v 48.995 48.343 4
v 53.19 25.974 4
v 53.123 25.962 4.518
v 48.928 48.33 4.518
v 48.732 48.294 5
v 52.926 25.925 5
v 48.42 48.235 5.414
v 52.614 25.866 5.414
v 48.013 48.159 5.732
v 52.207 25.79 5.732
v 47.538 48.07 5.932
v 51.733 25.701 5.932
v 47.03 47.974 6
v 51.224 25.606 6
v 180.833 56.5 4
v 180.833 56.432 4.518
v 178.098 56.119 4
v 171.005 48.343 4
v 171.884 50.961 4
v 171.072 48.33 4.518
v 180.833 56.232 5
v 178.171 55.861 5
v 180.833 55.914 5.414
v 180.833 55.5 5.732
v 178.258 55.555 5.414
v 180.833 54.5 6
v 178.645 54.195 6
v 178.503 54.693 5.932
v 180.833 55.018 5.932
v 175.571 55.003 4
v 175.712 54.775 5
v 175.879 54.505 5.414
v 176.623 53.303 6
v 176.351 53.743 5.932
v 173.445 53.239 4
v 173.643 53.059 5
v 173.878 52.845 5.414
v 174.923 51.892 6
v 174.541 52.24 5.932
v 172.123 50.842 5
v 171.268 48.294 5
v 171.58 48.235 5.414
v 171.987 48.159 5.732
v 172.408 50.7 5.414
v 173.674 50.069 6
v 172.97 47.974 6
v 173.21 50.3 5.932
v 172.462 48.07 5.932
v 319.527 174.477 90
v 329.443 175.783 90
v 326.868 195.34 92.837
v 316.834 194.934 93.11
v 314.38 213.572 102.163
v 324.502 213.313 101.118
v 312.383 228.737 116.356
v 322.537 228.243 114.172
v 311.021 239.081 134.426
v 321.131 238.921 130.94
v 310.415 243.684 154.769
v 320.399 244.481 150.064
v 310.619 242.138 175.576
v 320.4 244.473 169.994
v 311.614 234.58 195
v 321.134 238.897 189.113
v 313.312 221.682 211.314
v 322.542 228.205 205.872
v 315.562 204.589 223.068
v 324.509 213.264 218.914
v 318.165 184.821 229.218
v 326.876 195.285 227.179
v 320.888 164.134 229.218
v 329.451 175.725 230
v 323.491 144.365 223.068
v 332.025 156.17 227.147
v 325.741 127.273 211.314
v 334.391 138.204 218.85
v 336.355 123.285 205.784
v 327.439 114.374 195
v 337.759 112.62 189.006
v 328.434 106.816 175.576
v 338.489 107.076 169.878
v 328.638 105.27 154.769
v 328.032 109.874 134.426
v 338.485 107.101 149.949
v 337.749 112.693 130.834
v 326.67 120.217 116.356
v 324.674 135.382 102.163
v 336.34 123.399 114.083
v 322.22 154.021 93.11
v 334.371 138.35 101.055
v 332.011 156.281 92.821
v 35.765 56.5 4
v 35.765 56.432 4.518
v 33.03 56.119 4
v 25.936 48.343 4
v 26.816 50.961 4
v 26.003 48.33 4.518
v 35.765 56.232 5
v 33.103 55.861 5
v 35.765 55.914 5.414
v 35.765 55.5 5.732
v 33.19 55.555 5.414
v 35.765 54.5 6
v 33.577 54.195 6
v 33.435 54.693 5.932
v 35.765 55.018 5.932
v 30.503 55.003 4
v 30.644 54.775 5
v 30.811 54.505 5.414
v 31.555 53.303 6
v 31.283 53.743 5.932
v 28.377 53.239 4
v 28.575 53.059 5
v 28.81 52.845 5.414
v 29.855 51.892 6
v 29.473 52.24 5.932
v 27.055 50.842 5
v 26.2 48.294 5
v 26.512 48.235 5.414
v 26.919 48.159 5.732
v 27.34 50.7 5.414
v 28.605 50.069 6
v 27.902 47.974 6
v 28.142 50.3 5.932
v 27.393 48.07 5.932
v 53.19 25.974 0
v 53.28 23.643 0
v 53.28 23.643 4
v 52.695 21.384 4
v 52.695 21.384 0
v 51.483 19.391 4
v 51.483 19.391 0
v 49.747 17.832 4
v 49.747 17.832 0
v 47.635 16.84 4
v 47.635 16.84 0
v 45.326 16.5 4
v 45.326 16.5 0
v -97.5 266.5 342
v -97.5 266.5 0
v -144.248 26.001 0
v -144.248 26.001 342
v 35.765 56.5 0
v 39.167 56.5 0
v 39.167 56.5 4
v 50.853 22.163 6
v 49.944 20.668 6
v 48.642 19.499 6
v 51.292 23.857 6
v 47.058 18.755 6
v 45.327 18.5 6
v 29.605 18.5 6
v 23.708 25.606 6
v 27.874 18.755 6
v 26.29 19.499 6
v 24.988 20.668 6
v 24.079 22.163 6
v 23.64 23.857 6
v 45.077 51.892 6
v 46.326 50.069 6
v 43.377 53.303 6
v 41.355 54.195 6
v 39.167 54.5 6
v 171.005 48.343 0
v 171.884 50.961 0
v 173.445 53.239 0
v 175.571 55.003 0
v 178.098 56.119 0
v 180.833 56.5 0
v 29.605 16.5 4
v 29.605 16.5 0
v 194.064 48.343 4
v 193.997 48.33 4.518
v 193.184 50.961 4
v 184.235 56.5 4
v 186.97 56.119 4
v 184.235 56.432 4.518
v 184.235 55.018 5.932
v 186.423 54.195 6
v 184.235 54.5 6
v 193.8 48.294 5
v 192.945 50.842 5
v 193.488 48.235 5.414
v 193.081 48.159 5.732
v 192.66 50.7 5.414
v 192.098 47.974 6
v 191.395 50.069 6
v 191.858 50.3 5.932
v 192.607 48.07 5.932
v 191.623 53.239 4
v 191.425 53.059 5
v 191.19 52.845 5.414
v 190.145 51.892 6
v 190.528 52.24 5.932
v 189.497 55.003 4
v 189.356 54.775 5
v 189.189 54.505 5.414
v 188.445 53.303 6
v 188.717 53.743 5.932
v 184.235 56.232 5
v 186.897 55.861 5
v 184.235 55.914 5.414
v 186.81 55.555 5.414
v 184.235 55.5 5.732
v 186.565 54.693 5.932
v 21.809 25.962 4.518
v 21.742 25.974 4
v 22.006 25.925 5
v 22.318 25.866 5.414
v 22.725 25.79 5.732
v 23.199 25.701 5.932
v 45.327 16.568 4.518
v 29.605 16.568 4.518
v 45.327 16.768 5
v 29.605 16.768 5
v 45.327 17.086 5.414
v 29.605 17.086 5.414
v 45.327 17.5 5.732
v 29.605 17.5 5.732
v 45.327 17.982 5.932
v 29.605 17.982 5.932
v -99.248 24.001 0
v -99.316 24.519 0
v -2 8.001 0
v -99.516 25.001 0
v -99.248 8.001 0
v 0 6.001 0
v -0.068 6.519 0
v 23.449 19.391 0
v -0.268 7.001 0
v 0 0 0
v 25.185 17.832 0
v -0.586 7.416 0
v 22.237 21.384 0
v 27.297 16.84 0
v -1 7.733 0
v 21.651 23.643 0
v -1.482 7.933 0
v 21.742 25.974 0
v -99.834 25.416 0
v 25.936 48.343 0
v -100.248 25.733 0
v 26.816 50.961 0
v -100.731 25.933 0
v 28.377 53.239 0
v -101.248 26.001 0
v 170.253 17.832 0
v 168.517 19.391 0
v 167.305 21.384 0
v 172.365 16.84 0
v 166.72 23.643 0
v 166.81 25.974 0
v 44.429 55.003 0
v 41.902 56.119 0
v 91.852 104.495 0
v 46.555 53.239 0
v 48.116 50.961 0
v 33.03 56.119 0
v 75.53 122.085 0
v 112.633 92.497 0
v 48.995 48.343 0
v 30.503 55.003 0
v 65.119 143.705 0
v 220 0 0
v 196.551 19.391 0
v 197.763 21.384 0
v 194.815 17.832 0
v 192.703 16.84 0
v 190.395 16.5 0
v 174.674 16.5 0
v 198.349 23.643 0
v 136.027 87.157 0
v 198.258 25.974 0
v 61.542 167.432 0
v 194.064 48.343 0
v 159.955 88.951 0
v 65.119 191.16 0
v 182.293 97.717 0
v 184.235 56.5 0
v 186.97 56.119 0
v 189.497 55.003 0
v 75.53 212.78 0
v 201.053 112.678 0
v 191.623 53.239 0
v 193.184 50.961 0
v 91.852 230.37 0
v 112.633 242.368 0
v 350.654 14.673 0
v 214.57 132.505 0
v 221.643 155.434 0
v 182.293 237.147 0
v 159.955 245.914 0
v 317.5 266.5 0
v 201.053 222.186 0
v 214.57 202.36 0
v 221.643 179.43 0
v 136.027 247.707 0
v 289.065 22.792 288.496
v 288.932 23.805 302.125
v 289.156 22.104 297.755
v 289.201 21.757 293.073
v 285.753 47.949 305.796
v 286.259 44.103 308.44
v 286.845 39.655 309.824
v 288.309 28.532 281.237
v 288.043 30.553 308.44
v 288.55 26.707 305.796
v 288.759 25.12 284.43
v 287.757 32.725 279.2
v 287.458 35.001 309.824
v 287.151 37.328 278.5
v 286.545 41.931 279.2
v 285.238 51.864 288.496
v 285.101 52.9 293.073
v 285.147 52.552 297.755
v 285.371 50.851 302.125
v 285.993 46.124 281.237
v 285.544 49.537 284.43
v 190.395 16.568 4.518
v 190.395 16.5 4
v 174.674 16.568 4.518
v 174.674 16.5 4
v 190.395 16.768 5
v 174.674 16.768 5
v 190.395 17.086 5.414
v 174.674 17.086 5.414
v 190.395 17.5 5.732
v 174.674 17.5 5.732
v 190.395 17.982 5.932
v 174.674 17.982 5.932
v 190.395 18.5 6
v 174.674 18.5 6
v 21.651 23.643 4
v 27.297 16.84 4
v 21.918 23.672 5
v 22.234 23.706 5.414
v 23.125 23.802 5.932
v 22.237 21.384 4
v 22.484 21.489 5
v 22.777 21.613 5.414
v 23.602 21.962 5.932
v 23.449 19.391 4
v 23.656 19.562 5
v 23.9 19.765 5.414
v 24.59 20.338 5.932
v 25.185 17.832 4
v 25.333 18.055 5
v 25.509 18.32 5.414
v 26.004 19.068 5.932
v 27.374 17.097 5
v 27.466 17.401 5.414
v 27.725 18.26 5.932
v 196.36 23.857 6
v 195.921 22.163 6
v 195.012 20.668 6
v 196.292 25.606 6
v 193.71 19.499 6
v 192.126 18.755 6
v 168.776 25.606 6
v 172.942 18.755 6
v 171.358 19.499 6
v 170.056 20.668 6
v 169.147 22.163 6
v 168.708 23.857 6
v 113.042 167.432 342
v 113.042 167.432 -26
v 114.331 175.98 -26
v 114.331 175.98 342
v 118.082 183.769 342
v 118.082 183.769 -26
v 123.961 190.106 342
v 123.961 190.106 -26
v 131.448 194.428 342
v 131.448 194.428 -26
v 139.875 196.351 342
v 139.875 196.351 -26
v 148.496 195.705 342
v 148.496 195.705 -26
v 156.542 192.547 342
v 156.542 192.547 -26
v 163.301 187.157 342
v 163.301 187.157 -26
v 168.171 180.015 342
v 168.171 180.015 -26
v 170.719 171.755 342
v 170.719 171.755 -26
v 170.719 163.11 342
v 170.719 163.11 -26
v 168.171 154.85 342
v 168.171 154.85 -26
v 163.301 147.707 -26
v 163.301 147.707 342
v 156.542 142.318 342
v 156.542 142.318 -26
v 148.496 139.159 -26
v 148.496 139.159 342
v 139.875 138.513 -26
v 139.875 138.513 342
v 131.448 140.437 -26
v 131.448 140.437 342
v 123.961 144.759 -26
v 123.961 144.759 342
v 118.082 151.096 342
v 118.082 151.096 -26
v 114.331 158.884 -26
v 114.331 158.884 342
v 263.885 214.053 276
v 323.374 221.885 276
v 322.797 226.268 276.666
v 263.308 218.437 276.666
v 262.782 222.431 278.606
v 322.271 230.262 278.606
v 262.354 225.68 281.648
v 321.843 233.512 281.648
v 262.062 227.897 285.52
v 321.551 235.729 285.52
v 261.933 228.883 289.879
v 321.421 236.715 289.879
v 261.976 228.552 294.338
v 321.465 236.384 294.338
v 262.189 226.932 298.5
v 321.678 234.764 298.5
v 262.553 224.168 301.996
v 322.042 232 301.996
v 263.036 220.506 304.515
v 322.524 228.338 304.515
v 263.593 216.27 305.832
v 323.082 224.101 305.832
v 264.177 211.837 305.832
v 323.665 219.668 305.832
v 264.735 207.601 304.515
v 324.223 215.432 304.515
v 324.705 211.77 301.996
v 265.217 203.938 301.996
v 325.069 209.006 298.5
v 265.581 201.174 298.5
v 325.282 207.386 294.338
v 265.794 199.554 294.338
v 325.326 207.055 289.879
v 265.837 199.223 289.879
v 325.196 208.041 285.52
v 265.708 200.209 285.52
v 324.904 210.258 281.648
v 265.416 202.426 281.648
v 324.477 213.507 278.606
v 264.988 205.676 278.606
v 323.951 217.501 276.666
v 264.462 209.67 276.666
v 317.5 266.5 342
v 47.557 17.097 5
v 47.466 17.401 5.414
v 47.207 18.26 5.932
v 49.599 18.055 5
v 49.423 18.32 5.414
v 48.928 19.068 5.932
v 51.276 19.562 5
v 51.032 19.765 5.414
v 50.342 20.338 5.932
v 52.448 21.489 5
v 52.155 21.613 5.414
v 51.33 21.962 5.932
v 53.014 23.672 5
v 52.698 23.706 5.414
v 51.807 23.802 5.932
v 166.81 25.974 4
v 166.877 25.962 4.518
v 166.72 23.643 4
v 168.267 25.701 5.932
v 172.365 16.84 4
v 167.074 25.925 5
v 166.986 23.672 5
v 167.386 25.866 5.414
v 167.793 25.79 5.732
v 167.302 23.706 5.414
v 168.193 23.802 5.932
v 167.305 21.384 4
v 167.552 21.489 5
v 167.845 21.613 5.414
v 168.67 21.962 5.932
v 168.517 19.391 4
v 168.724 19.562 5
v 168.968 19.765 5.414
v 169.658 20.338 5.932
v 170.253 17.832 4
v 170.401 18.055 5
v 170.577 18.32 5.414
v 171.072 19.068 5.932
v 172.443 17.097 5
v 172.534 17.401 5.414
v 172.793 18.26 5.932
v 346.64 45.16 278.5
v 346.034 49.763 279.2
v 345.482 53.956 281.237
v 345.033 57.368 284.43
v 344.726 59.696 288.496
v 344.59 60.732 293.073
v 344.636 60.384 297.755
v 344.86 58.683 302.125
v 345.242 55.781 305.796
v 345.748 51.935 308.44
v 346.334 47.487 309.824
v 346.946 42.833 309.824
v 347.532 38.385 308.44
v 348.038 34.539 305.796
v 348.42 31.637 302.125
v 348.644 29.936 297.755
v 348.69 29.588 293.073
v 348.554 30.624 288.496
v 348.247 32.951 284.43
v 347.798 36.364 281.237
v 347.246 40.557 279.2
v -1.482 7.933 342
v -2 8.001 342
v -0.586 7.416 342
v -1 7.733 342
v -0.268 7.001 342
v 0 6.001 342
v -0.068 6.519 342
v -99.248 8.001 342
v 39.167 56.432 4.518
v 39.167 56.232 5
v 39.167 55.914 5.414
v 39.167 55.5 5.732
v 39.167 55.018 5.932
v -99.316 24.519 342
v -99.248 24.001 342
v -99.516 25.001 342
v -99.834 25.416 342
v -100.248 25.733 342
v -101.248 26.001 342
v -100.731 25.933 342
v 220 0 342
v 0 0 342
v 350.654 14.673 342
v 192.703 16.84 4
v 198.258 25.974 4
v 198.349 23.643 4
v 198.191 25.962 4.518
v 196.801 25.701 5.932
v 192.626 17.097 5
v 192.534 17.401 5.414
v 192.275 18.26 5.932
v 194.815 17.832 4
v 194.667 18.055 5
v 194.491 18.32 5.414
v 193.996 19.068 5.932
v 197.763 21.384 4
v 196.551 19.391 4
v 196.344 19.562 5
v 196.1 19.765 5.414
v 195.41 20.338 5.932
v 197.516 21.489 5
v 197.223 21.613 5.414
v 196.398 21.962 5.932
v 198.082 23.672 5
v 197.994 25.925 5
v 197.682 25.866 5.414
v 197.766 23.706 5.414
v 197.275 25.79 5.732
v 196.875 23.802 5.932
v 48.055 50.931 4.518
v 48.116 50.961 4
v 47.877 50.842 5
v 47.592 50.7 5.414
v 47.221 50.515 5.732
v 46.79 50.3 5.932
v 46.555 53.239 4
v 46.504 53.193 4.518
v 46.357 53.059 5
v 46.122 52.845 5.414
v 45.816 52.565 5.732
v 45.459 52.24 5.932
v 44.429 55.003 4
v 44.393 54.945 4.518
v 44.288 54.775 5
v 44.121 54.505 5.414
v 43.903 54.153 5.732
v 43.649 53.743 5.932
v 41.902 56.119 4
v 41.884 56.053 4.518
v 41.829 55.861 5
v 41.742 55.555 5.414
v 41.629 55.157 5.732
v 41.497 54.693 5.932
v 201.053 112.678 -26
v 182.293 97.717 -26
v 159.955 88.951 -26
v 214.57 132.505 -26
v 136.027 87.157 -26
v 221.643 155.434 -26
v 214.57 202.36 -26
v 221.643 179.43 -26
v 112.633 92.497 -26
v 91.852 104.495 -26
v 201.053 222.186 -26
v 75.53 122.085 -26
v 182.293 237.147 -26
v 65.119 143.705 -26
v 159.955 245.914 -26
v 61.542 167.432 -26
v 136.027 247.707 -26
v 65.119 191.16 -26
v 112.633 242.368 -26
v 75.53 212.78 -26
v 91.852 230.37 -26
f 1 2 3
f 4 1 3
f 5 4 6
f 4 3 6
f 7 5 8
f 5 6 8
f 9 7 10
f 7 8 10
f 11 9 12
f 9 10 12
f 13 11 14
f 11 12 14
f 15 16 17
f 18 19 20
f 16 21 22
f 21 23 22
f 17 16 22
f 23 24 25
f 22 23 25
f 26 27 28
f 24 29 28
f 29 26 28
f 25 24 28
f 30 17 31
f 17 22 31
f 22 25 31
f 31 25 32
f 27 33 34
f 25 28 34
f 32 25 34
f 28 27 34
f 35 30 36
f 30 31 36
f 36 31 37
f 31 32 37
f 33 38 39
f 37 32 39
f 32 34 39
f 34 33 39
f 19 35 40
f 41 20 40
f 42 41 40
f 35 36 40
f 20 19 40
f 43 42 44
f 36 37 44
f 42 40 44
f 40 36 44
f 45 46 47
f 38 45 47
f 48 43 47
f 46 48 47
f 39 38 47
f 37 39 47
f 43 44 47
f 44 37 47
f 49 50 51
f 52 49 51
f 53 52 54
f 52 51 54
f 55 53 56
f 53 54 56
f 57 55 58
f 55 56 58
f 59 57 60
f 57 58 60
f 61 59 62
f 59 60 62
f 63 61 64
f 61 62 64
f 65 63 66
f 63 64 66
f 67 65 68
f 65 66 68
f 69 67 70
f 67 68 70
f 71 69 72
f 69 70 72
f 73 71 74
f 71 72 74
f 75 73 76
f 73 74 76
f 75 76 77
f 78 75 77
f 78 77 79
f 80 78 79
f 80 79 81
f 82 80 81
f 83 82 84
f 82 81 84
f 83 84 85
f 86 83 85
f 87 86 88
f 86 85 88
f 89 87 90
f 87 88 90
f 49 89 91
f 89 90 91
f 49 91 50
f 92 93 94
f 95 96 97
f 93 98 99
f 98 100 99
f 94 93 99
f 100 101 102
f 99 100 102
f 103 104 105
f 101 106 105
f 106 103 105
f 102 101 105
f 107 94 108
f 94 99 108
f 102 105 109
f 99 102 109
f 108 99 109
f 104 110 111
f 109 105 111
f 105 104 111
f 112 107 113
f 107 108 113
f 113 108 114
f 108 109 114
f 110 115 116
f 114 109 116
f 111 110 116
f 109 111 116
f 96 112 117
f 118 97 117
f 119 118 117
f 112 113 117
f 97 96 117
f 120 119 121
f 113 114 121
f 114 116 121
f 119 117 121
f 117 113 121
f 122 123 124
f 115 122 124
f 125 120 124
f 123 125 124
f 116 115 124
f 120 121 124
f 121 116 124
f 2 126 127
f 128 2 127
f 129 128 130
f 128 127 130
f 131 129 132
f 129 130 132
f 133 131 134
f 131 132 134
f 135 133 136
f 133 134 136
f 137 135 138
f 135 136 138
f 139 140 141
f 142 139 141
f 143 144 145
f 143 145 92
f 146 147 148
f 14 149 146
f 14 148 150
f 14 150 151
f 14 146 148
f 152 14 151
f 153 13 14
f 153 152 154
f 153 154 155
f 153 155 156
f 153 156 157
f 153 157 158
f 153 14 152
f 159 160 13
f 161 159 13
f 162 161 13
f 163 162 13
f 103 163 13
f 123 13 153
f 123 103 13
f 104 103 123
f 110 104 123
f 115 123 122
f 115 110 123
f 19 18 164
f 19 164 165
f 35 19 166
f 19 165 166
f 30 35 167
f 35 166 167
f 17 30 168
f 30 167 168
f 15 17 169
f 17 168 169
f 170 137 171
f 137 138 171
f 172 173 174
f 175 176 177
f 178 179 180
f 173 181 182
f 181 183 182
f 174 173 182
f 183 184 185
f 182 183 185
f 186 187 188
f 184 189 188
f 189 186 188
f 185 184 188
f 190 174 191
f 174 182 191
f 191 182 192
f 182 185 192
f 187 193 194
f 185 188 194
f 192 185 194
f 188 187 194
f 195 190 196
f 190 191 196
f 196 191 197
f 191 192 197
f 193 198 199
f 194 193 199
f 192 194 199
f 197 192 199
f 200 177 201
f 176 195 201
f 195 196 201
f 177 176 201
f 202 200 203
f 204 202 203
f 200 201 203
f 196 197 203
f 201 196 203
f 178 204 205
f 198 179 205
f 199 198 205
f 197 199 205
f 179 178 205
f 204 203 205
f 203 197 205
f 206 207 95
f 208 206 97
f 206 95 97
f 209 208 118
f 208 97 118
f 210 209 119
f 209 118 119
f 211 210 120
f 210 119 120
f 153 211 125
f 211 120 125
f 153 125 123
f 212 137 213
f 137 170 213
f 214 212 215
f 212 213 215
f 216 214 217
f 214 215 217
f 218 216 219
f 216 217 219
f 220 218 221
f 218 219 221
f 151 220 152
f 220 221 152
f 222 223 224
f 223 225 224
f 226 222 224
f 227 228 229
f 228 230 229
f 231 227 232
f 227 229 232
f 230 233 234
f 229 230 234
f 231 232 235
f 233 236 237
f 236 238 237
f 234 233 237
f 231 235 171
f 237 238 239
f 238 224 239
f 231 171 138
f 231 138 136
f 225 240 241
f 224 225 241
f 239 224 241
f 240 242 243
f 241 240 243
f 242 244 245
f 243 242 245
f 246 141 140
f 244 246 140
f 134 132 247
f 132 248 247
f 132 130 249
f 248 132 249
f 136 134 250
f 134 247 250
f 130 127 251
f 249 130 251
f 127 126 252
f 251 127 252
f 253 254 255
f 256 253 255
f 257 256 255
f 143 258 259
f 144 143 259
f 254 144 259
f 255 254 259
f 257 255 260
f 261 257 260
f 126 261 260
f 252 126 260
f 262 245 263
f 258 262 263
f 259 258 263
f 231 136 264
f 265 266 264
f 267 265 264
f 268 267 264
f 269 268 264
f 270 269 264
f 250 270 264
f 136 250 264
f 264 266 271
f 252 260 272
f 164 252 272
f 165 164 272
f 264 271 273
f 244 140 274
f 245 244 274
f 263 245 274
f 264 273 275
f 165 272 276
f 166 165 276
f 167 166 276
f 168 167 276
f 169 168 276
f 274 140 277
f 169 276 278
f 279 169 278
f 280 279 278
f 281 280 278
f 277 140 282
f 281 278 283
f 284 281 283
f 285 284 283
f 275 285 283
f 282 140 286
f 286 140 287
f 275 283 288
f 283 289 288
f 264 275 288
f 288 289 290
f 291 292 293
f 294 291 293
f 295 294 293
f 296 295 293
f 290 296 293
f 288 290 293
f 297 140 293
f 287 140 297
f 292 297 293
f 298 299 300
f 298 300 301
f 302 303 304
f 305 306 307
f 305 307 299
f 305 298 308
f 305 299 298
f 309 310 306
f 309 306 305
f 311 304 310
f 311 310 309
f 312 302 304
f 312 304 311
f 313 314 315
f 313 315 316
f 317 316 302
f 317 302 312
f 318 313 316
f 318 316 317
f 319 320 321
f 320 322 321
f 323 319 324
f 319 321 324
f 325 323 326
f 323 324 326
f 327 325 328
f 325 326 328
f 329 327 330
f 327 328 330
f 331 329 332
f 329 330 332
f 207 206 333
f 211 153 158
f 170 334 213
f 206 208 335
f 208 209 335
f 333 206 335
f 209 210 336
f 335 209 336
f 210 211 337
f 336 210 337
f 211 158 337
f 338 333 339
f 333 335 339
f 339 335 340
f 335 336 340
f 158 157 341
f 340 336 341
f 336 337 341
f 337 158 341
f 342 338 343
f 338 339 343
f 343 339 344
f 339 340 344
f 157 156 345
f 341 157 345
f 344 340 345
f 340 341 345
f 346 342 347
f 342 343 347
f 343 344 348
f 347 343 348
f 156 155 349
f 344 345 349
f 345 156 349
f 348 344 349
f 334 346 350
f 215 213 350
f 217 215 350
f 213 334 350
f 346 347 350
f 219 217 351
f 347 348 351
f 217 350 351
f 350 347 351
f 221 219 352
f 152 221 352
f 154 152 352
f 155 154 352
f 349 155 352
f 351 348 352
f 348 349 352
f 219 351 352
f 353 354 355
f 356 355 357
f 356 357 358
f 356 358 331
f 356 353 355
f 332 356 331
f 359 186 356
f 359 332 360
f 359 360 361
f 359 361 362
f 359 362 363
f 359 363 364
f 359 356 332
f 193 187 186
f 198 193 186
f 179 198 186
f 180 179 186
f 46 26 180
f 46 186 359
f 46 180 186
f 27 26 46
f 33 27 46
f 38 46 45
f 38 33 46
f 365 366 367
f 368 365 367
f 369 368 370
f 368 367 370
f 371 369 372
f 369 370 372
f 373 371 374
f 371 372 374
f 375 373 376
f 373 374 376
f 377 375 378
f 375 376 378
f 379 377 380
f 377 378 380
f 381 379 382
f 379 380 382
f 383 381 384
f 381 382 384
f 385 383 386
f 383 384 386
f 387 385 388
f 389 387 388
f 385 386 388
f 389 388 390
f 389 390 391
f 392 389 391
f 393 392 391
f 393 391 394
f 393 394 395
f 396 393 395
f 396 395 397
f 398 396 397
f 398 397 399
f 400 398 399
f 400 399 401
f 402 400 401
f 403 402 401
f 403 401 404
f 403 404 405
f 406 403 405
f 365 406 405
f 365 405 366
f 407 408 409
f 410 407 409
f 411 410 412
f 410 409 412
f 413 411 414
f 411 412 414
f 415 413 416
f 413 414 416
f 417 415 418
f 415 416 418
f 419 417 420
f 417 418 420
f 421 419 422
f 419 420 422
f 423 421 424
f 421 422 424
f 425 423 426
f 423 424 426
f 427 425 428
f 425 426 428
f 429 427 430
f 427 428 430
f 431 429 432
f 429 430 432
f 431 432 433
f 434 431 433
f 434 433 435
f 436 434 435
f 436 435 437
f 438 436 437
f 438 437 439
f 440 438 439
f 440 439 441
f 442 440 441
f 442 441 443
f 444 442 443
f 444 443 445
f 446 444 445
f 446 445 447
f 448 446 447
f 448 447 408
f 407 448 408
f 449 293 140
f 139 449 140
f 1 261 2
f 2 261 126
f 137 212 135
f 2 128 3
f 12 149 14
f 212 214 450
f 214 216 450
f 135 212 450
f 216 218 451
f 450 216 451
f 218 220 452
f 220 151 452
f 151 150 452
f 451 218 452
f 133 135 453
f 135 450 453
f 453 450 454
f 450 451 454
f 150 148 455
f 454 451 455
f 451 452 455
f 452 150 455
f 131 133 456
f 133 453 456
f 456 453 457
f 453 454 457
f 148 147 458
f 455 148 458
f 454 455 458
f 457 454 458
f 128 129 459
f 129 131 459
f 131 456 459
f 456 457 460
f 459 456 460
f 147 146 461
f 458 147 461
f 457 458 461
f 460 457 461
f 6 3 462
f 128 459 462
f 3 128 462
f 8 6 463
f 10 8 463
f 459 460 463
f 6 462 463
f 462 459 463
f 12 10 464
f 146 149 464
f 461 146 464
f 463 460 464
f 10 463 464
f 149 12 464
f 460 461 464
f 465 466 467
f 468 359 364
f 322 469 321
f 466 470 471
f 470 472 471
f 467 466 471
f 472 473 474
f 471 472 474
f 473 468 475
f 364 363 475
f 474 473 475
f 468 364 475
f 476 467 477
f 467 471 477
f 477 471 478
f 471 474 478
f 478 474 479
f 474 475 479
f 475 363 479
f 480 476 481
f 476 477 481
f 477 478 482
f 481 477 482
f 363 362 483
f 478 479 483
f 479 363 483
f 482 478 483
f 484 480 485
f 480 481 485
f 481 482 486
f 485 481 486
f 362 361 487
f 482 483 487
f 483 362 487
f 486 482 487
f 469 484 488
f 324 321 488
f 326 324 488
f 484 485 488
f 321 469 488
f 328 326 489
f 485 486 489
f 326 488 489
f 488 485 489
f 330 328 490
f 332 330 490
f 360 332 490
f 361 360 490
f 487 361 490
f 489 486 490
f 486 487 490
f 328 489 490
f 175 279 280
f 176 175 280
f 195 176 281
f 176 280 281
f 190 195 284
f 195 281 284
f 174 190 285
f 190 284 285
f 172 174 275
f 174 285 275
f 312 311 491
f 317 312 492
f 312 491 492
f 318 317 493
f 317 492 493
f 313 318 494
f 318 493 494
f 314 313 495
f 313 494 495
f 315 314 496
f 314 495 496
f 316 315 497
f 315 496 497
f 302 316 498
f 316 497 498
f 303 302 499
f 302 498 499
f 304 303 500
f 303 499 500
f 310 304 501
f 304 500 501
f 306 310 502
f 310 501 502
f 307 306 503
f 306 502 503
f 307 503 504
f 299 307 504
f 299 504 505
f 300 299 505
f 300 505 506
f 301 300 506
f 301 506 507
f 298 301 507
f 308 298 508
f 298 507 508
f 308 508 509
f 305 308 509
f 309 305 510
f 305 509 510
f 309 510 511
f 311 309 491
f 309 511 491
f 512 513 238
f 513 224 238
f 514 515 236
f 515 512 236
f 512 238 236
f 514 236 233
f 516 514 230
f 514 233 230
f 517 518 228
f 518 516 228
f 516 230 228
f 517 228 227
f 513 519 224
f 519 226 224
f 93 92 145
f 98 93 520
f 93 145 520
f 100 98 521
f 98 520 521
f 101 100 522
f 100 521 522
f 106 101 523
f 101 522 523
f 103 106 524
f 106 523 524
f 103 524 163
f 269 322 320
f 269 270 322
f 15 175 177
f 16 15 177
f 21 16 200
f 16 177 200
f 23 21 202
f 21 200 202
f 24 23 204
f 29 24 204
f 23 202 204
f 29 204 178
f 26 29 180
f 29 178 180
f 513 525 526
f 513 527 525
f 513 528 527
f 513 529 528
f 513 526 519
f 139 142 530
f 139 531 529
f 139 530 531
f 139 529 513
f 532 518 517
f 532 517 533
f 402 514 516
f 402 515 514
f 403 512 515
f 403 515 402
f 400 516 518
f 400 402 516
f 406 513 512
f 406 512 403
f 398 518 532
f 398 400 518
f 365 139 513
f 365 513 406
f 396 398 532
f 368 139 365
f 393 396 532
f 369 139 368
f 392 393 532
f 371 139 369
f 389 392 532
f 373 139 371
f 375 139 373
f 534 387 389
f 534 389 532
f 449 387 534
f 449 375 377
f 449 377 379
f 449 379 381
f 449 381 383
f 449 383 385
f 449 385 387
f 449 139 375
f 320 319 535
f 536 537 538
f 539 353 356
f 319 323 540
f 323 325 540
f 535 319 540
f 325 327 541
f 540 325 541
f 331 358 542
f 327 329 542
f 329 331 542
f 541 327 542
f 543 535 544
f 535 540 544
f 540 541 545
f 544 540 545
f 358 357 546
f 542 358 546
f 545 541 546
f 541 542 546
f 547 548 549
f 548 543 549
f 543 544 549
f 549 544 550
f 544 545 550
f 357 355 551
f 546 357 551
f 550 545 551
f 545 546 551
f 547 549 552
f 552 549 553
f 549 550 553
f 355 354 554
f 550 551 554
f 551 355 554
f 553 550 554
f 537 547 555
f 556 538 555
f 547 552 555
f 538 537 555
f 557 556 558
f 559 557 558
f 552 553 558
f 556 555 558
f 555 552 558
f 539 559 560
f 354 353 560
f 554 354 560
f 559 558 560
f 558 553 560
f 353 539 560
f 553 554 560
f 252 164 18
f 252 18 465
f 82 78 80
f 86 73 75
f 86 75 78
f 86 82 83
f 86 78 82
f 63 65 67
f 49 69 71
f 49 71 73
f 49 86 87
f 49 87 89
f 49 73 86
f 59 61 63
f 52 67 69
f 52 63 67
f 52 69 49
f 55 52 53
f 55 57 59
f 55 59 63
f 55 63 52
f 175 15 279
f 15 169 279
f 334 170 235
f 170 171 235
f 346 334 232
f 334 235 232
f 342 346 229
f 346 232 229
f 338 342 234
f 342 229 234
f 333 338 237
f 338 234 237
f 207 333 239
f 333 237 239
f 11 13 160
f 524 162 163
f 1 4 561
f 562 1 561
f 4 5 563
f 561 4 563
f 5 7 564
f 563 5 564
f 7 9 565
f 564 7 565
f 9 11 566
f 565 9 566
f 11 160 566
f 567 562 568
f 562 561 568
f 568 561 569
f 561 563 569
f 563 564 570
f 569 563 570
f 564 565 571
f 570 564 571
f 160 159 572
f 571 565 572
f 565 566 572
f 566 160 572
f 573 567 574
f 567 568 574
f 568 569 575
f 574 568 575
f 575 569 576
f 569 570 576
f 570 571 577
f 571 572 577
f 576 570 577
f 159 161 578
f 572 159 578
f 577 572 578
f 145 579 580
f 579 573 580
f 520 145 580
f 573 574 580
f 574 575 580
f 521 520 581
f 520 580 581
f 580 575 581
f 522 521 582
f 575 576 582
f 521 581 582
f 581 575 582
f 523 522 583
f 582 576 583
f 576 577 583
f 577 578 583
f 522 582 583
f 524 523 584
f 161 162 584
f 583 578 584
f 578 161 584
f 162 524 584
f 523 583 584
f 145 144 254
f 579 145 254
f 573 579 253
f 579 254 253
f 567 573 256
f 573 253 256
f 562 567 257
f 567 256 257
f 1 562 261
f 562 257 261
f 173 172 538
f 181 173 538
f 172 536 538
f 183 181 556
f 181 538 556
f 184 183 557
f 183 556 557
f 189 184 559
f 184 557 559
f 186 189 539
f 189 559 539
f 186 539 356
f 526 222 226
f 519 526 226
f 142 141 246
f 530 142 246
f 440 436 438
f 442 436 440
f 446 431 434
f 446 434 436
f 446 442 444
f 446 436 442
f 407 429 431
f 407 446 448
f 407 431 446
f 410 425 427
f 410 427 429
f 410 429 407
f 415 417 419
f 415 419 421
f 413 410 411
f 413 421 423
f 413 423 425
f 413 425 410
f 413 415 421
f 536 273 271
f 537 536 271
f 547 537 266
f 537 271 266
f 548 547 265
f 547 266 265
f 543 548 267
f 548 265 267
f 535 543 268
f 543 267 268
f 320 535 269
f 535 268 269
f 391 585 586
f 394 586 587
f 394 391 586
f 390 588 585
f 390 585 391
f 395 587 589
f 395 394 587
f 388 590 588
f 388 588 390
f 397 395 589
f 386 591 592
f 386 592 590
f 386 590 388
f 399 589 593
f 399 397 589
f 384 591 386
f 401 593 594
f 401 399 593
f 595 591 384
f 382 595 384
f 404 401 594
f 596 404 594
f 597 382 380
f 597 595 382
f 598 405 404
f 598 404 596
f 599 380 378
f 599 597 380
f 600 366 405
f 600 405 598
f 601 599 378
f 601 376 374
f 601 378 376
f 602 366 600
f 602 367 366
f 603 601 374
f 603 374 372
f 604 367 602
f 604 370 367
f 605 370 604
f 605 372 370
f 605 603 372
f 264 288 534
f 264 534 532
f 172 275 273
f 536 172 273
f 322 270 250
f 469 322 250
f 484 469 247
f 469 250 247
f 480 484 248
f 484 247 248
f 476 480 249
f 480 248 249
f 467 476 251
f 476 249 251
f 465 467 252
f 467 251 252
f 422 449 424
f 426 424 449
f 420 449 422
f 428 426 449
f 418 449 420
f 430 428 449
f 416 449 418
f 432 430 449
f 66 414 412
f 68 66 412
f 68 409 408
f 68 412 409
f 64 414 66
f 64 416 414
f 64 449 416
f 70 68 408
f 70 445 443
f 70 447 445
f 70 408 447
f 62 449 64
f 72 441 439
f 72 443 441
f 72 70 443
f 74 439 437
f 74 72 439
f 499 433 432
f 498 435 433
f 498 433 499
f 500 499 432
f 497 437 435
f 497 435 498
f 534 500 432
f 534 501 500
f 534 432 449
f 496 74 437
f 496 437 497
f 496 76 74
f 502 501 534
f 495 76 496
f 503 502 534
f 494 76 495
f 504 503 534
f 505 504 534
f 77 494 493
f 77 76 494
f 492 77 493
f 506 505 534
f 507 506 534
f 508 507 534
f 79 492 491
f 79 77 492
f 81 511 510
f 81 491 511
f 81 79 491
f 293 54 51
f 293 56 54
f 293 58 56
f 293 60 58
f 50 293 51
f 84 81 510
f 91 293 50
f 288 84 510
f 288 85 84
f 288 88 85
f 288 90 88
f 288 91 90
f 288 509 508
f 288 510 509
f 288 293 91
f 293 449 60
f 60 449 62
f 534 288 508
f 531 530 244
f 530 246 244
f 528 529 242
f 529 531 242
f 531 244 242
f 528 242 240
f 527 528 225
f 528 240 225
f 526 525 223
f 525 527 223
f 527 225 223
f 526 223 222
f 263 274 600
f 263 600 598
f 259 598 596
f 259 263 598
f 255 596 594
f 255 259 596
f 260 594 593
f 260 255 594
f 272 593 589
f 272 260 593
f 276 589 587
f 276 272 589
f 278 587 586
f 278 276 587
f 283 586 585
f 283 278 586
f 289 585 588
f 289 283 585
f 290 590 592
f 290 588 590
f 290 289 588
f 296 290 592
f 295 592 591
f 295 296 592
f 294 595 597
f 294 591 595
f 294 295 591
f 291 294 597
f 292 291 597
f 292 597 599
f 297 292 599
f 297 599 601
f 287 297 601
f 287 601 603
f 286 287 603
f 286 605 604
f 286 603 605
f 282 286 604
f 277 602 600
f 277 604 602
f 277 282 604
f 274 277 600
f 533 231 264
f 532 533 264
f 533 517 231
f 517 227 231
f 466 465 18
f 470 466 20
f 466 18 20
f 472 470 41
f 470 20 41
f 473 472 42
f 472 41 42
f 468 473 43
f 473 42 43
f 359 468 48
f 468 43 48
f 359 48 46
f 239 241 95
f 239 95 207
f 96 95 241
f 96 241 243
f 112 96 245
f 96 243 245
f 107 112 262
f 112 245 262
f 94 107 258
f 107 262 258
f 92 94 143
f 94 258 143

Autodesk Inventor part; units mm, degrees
ref_plane "YZ Plane" through (0, 0, 0) normal (1, 0, 0) x (0, 1, 0)
ref_plane "XZ Plane" through (0, 0, 0) normal (0, 1, 0) x (-1, 0, 0)
ref_plane "XY Plane" through (0, 0, 0) normal (0, 0, 1) x (1, 0, 0)
sketch "Sketch1" plane through (0, 0, 0) normal (0, 0, 1) x (1, 0, 0)
  line L0 (0, 0) -> (220, 0)
  line L1 (110, 0) -> (110, 266.5) construction
  line L2 (110, 266.5) -> (317.5, 266.5)
  line L3 (110, 266.5) -> (-97.5, 266.5)
  line L4 (220, 0) -> (340, 0) construction
  line L5 (317.5, 266.5) -> (350.6537, 14.673)
  line L6 (317.5, 266.5) -> (571.5, 266.5) construction
  line L7 (350.6537, 14.673) -> (220, 0)
  line L8 (-97.5, 266.5) -> (-144.2482, 26.0013)
  line L9 (-97.5, 266.5) -> (147.5, 266.5) construction
  line L10 (-144.2482, 26.0013) -> (-101.2482, 26.0013)
  line L11 (-99.2482, 24.0013) -> (-99.2482, 8.0013)
  line L12 (-99.2482, 8.0013) -> (-2, 8.0013)
  line L13 (0, 6.0013) -> (0, 0)
  arc A0 (0, 6.0013) -> (-2, 8.0013) centre (-2, 6.0013) ccw
  arc A1 (-99.2482, 24.0013) -> (-101.2482, 26.0013) centre (-101.2482, 24.0013) ccw
  point P0 (-99.2482, 26.0013)
  dimension "d0" = 220
  dimension "d1" = 266.5
  dimension "d7" = 254
  dimension "d8" = 82.5
  dimension "d9" = 245
  dimension "d10" = 101
  dimension "d11" = 45
  dimension "d12" = 18
  dimension "d14" = 415
  dimension "d15" = 2
  dimension "d16" = 2
extrude "Extrusion1" add sketch "Sketch1" along normal blind 342
sketch "Sketch3" plane through (317.5, 266.5, 342) normal (0.9914, 0.1305, 0) x (0, 0, -1)
  circle A0 centre (182, -91.5) radius 70
  line L0 (342, -254) -> (342, 0) projected
  line L1 (342, 0) -> (0, 0) projected
  line L2 (252, -91.5) -> (342, -91.5) construction
  line L3 (182, -21.5) -> (182, 0) construction
  point P0 (342, -222.778)
  dimension "d22" = 140
  dimension "d26" = 160
  dimension "d27" = 70
  dimension "d28" = 91.5
  dimension "d29" = 70
extrude "Extrusion2" cut sketch "Sketch3" against normal blind 10
sketch "Sketch4" plane through (317.5, 266.5, 342) normal (0.9914, 0.1305, 0) x (0, 0, -1)
  line L0 (342, 0) -> (0, 0) projected
  line L1 (0, -254) -> (0, 0) projected
  circle A0 centre (51, -45) radius 15
  line L2 (51, 0) -> (51, -45) construction
  line L3 (51, -45) -> (0, -45) construction
  circle A1 centre (47.75, -223.25) radius 15.75
  line L4 (342, -254) -> (0, -254) projected
  line L5 (47.75, -223.25) -> (0, -223.25) construction
  line L6 (47.75, -223.25) -> (47.75, -254) construction
  point P0 (342, -222.778)
  dimension "d34" = 30
  dimension "d37" = 45
  dimension "d38" = 51
  dimension "d39" = 31.5
  dimension "d42" = 30.75
  dimension "d43" = 47.75
extrude "Extrusion3" cut sketch "Sketch4" against normal blind 60
sketch "Sketch5" plane through (0, 0, 0) normal (0, 0, -1) x (-1, 0, 0)
  line L0 (-350.6537, 14.673) -> (-317.5, 266.5) projected
  line L1 (-317.5, 266.5) -> (97.5, 266.5) projected
  circle A0 centre (-142.0425, 167.4324) radius 80.5
  line L2 (-142.0425, 247.9324) -> (-142.0425, 266.9324) construction
  line L3 (-142.0425, 167.4324) -> (-330.5425, 167.4324) construction
  point P0 (0, 0)
  dimension "d49" = 161
  dimension "d50" = 19
  dimension "d52" = 188.5
extrude "Extrusion4" add sketch "Sketch5" along normal blind 26
sketch "Sketch6" plane through (142.0425, 167.4324, -26) normal (0, 0, -1) x (-1, 0, 0)
  circle A0 centre (0, 0) radius 29
  point P0 (142.0425, -167.4324)
  dimension "d55" = 58
extrude "Extrusion5" cut sketch "Sketch6" against normal through all
sketch "Sketch7" plane through (0, 0, 0) normal (0, 0, -1) x (-1, 0, 0)
  line L0 (-39.1667, 56.5) -> (-35.7652, 56.5)
  line L1 (-45.3265, 16.5) -> (-29.6054, 16.5)
  line L2 (-48.9954, 48.3429) -> (-53.1895, 25.9743)
  line L3 (-25.9365, 48.3429) -> (-21.7424, 25.9743)
  arc A0 (-39.1667, 56.5) -> (-48.9954, 48.3429) centre (-39.1667, 46.5) ccw
  arc A1 (-25.9365, 48.3429) -> (-35.7652, 56.5) centre (-35.7652, 46.5) ccw
  arc A2 (-53.1895, 25.9743) -> (-45.3265, 16.5) centre (-45.3265, 24.5) ccw
  arc A3 (-29.6054, 16.5) -> (-21.7424, 25.9743) centre (-29.6054, 24.5) ccw
  line L4 (0, 0) -> (-220, 0) projected
  line L5 (-110, 0) -> (-110, 69.6289)
  line L6 (-180.8333, 56.5) -> (-184.2348, 56.5)
  line L7 (-174.6735, 16.5) -> (-190.3946, 16.5)
  line L8 (-171.0046, 48.3429) -> (-166.8105, 25.9743)
  line L9 (-194.0635, 48.3429) -> (-198.2576, 25.9743)
  arc A4 (-171.0046, 48.3429) -> (-180.8333, 56.5) centre (-180.8333, 46.5) ccw
  arc A5 (-184.2348, 56.5) -> (-194.0635, 48.3429) centre (-184.2348, 46.5) ccw
  arc A6 (-174.6735, 16.5) -> (-166.8105, 25.9743) centre (-174.6735, 24.5) ccw
  arc A7 (-198.2576, 25.9743) -> (-190.3946, 16.5) centre (-190.3946, 24.5) ccw
  point P0 (-47.466, 56.5)
  point P1 (-27.466, 56.5)
  point P2 (-54.966, 16.5)
  point P3 (-19.966, 16.5)
  point P4 (-172.534, 56.5)
  point P5 (-192.534, 56.5)
  point P6 (-165.034, 16.5)
  point P7 (-200.034, 16.5)
  dimension "d69" = 20
  dimension "d70" = 35
  dimension "d72" = 10
  dimension "d73" = 8
extrude "Extrusion6" cut sketch "Sketch7" against normal blind 6
fillet "Fillet1" radius 2 8 edges at (182.534, 56.5, 6) (174.447, 54.1951, 6) (168.9075, 37.1586, 6) (168.5174, 19.3909, 6) (182.534, 16.5, 6) (196.5507, 19.3909, 6) (196.1606, 37.1586, 6) (190.6211, 54.1951, 6)
fillet "Fillet2" radius 2 8 edges at (51.0925, 37.1586, 6) (45.553, 54.1951, 6) (37.466, 56.5, 6) (29.3789, 54.1951, 6) (23.8394, 37.1586, 6) (23.4493, 19.3909, 6) (37.466, 16.5, 6) (51.4826, 19.3909, 6)
ref_plane "Work Plane2" through (142.0425, 167.4324, -26) normal (-1, 0, 0) x (0, 0, 1)
properties part number "Gearbox"
